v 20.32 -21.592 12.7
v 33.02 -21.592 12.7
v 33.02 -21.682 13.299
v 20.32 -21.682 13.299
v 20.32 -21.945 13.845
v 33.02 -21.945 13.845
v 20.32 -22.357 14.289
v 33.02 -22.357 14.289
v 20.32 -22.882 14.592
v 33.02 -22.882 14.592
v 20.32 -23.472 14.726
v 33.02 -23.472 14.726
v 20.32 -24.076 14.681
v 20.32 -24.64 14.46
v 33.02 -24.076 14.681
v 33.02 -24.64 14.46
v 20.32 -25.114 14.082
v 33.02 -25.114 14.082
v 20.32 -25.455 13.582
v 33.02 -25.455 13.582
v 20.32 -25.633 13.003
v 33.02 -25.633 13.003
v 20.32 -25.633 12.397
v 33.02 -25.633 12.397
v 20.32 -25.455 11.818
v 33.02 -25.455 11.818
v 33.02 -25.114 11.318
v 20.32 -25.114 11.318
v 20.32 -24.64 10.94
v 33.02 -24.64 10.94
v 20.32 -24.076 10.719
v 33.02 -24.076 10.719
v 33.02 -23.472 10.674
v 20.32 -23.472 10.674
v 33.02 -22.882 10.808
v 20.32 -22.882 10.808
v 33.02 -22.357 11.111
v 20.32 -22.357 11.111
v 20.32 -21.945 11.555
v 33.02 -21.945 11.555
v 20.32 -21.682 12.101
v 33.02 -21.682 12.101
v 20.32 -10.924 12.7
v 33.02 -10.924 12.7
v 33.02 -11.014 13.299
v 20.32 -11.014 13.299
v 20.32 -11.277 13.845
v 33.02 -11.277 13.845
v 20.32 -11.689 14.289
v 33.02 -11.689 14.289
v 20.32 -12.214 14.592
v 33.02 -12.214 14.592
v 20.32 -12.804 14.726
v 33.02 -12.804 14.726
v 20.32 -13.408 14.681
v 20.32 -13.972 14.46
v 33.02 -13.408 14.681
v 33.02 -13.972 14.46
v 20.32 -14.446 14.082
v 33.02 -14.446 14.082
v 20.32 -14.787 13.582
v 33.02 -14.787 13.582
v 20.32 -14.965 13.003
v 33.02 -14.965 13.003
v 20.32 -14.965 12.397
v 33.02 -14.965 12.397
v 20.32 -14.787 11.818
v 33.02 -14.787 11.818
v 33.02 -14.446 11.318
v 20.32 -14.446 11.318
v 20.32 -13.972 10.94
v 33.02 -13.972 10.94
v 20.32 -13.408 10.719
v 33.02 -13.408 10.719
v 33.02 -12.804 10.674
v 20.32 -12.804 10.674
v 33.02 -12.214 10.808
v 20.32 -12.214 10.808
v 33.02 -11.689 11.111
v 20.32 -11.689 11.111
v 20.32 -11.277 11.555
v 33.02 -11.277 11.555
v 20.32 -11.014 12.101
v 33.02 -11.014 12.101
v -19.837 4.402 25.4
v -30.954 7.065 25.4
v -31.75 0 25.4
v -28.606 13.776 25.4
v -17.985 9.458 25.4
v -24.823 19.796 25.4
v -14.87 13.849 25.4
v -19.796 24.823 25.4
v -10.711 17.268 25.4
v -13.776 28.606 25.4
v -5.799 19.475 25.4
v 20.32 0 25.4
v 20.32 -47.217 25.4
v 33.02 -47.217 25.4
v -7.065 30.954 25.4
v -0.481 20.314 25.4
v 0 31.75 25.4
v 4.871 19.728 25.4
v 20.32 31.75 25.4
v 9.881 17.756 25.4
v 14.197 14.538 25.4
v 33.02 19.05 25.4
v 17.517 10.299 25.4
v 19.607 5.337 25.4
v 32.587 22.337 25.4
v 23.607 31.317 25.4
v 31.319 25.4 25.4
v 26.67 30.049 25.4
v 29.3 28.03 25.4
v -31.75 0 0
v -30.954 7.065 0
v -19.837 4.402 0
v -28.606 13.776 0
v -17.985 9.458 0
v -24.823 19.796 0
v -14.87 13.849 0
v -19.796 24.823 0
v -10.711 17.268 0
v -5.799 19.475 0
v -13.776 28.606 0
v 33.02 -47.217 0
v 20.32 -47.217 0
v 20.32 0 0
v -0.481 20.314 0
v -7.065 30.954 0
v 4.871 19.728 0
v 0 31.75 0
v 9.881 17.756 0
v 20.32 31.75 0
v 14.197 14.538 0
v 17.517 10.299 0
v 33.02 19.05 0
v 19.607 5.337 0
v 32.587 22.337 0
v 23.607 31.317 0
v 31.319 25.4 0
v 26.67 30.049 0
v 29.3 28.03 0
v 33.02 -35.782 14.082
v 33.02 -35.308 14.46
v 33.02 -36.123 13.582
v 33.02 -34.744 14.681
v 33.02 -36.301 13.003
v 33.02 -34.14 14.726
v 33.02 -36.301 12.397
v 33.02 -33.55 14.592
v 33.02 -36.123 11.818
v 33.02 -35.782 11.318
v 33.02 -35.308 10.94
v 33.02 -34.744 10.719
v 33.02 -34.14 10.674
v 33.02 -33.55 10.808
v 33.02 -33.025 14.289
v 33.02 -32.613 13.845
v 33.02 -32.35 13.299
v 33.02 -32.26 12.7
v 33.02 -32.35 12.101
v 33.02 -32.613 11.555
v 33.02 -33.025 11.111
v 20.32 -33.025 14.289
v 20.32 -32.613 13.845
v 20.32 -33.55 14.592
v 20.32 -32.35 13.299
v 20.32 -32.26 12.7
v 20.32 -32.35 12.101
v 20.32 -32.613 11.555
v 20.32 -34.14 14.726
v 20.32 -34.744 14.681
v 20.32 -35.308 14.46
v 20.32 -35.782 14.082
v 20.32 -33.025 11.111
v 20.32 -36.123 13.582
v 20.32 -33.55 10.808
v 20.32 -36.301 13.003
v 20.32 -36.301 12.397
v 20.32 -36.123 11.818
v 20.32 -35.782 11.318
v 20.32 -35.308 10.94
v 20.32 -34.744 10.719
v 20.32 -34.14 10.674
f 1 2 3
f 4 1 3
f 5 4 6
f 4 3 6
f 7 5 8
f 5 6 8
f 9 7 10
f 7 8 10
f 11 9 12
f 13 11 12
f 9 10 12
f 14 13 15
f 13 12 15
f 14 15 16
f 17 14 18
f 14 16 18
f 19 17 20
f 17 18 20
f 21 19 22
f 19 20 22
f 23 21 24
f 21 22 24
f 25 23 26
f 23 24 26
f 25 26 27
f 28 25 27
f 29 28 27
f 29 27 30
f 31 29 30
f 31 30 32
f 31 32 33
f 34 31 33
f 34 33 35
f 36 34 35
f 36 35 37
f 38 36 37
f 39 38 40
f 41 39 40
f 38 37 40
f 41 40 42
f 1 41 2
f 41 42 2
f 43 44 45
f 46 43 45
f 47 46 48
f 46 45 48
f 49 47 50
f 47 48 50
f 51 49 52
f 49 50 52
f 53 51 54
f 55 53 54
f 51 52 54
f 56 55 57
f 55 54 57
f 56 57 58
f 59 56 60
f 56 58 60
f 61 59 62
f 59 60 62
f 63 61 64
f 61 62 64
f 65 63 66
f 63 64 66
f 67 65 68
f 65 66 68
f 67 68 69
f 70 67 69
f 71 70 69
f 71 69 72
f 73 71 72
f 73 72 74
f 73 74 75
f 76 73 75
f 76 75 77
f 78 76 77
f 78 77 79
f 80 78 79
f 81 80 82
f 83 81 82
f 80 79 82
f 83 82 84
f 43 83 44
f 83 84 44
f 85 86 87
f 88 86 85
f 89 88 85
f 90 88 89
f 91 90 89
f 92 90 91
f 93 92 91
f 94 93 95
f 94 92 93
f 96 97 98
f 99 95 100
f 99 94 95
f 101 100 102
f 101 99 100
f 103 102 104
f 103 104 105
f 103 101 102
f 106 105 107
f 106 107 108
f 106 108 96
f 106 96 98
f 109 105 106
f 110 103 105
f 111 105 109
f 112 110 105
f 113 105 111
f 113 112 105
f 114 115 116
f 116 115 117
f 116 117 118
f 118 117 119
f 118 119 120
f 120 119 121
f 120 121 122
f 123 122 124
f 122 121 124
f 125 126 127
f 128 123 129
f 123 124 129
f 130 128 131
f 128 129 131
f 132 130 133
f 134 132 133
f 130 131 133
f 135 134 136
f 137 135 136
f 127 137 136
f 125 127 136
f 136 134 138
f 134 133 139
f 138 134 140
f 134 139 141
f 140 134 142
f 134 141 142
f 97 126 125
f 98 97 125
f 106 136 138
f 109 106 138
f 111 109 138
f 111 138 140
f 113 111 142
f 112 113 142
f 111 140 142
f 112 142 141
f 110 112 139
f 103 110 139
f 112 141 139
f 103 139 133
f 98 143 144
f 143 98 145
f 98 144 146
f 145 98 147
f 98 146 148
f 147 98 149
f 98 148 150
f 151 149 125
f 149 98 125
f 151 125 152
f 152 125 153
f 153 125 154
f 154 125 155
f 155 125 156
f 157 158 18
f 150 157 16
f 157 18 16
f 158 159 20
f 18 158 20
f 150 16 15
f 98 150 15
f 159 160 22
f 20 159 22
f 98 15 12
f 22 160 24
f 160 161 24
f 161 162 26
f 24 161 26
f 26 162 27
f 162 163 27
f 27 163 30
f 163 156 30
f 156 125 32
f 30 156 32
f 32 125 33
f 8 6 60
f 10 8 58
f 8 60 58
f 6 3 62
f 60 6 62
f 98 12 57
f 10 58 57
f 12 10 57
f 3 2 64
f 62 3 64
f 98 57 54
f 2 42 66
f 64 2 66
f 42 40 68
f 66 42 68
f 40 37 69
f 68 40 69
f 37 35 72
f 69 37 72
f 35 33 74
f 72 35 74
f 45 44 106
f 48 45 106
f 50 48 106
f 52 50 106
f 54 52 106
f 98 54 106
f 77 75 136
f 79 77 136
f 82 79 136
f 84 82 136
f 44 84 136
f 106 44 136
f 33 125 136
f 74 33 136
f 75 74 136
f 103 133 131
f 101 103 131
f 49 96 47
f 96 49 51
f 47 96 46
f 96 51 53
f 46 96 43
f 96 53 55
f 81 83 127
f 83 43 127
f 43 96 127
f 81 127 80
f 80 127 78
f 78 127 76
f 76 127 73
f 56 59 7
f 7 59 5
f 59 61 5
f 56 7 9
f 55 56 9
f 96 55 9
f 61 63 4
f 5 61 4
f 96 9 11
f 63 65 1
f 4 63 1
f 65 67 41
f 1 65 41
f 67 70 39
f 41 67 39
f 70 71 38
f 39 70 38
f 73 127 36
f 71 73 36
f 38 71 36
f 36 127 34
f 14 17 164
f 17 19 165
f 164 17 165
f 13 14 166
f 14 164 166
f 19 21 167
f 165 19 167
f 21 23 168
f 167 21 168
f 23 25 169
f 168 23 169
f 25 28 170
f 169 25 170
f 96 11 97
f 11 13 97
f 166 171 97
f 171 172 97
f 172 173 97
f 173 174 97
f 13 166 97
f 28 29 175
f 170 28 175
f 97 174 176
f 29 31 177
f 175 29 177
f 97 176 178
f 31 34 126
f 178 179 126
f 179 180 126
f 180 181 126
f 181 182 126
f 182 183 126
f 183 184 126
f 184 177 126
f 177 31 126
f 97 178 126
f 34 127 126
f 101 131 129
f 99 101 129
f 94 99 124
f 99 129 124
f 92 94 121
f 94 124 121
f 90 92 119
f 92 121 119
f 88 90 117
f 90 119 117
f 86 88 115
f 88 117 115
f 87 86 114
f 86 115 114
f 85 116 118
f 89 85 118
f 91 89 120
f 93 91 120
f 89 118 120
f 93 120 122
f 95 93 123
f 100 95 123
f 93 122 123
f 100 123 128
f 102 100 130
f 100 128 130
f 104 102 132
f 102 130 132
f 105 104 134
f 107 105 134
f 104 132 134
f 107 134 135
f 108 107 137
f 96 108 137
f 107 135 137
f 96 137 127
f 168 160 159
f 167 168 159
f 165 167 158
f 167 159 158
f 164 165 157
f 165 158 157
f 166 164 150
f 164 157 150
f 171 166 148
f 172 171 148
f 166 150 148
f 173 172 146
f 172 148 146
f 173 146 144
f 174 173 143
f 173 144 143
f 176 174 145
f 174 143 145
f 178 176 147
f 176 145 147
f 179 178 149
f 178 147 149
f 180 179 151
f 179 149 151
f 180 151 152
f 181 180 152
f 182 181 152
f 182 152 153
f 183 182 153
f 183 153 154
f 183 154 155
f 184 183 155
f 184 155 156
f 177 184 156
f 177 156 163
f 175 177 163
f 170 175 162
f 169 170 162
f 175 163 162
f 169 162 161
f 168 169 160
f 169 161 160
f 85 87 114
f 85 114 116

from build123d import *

# Parameters (mm, degrees)
F1_DEPTH = 25.4
F2_R     = 2.032
F3_DEPTH = 12.7


with BuildPart() as f1:
    # F0 (on Top) → F1 (new body)
    with BuildSketch(Plane.XY):
        with BuildLine():
            ThreePointArc((-19.8374, 4.402268), (2.214321, 20.19899), (20.32, 0))
            Line((20.32, 0), (20.32, -47.217399))
            Line((20.32, -47.217399), (33.02, -47.217399))
            Line((33.02, -47.217399), (33.02, 19.05))
            ThreePointArc((33.02, 19.05), (29.300256, 28.030256), (20.32, 31.75))
            Line((20.32, 31.75), (0, 31.75))
            ThreePointArc((0, 31.75), (-22.45064, 22.45064), (-31.75, 0))
            Line((-31.75, 0), (-19.8374, 4.402268))
        make_face()
    extrude(amount=F1_DEPTH)

    # F2 (on face) → F3 (cut, through all)
    with BuildSketch(Plane.YZ.offset(33.02)):
        with Locations((-34.291968, 12.7)):
            Circle(F2_R)
        with Locations((-23.623968, 12.7)):
            Circle(F2_R)
        with Locations((-12.955968, 12.7)):
            Circle(F2_R)
    extrude(amount=-F3_DEPTH, mode=Mode.SUBTRACT)


solid = f1.part
